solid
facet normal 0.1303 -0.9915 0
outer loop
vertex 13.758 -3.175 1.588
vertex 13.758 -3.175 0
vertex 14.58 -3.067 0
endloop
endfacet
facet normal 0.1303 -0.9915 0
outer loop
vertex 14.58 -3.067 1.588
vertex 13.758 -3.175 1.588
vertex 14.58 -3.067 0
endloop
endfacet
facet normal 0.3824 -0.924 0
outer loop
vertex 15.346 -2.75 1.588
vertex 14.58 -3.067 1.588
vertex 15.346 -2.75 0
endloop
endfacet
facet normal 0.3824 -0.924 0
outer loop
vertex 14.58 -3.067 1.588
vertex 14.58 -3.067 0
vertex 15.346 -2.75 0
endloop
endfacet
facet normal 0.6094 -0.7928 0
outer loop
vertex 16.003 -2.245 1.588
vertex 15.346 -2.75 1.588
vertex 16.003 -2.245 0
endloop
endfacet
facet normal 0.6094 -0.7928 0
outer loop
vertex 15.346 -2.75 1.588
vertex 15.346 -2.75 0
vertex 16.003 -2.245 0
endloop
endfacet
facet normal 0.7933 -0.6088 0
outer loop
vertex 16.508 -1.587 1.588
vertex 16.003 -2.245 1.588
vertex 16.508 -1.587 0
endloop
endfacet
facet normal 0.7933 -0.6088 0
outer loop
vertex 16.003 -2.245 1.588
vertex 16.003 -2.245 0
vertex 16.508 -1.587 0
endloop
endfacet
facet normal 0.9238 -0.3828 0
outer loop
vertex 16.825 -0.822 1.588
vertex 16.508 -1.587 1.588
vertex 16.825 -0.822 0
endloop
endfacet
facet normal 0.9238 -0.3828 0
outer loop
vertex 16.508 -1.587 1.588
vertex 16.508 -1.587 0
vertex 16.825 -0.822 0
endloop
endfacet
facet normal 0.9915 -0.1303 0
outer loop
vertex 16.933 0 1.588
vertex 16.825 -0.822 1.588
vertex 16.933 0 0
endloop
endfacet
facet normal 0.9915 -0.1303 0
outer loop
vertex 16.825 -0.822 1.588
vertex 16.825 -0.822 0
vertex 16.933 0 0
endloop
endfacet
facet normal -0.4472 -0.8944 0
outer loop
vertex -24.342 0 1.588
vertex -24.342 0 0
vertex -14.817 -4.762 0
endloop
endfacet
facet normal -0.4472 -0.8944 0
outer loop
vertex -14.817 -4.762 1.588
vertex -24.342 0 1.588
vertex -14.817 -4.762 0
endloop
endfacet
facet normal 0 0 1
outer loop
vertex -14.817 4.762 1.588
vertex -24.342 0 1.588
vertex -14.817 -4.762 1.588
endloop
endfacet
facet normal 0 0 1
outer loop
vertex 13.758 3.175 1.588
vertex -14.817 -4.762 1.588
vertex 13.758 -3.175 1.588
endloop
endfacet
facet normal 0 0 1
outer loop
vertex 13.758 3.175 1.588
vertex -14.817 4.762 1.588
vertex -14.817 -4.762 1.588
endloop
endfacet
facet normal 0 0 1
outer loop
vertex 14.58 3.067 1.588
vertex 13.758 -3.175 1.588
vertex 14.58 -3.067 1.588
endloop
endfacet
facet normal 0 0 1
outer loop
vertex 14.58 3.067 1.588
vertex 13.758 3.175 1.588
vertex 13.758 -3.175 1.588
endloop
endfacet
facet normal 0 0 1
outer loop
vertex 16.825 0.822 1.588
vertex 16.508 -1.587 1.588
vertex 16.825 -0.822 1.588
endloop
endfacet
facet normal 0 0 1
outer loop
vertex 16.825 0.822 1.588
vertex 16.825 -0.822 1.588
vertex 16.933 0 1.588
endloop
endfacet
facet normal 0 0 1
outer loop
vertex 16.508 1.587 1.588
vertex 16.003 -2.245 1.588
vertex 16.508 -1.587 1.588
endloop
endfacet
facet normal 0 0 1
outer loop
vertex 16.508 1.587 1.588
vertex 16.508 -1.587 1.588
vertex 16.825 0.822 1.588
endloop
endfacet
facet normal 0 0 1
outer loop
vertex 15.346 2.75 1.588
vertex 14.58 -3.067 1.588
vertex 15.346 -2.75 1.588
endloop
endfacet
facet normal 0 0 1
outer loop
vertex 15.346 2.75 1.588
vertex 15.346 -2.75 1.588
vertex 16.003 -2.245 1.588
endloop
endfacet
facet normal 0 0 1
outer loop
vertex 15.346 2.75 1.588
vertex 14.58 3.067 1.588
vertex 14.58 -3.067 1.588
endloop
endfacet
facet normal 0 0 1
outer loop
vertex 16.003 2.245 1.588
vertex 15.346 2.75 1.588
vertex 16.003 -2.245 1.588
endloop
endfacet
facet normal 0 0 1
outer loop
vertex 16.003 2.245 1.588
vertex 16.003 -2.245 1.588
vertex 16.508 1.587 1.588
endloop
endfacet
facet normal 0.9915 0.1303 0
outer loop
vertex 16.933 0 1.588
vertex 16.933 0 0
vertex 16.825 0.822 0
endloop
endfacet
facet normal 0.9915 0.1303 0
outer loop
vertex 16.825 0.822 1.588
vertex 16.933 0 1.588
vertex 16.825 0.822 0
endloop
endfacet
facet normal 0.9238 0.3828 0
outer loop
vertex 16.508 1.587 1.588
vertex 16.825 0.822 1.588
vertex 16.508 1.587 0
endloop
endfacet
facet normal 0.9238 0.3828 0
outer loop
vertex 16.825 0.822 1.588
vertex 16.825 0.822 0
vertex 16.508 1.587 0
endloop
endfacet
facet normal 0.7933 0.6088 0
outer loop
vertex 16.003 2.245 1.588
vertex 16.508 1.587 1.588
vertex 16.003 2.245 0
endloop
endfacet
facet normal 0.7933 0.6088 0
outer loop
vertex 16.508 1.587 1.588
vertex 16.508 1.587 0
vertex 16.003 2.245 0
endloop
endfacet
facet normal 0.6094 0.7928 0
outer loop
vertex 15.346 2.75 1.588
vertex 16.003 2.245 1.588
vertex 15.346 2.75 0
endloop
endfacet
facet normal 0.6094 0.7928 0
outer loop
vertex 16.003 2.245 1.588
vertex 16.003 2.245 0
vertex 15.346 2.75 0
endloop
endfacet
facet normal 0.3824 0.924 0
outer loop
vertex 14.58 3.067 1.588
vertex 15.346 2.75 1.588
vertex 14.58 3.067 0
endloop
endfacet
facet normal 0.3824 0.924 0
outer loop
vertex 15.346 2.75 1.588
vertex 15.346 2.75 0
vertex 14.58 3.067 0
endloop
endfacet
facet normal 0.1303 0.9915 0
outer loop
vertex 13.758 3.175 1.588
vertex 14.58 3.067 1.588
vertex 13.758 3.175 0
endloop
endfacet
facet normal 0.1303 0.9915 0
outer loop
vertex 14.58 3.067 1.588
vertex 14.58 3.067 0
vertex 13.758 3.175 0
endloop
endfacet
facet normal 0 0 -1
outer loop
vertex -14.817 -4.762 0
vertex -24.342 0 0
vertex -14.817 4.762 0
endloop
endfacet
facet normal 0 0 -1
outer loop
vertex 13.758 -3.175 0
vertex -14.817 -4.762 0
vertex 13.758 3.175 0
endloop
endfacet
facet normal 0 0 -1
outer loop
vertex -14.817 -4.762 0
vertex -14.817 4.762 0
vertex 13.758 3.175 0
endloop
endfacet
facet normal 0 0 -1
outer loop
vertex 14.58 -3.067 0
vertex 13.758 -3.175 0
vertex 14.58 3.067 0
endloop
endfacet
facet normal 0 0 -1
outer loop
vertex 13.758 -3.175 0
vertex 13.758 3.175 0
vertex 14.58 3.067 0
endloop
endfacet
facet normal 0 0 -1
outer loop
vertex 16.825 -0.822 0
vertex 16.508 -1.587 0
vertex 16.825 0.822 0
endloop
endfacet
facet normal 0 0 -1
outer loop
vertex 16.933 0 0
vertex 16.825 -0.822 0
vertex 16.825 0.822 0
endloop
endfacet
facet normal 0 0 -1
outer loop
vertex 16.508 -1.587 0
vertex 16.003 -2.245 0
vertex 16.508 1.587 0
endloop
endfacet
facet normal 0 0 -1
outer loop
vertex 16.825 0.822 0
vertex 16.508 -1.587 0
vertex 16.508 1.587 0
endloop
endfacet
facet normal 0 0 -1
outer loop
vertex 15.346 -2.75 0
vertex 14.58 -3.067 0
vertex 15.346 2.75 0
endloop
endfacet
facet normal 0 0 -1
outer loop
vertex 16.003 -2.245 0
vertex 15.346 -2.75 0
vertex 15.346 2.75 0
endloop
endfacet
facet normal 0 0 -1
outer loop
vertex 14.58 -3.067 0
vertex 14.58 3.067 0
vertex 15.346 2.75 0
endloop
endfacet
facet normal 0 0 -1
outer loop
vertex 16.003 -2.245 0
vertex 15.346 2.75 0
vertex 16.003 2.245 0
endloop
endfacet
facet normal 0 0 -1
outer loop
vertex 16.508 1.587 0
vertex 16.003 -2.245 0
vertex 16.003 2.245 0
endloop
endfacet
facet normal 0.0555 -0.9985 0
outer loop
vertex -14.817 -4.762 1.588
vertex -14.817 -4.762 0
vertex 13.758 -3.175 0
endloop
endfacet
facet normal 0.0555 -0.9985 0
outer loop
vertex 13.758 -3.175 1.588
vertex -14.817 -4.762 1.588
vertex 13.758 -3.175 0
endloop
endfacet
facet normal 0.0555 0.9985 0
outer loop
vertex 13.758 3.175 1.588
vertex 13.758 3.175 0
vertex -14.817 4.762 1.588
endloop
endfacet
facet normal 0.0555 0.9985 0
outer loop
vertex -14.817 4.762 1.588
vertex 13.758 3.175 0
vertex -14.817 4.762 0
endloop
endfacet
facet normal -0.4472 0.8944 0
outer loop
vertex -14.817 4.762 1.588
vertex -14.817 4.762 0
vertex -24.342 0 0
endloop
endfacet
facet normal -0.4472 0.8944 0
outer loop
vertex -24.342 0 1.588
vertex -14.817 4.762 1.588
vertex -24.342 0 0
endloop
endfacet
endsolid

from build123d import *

# Parameters (mm, degrees)
F1_DEPTH = 1.5875


with BuildPart() as f1:
    # F0 (on Top) → F1 (new body)
    with BuildSketch(Plane.XY):
        with BuildLine():
            ThreePointArc((10.583333, 0), (11.513269, 2.245064), (13.758333, 3.175))
            Line((13.758333, 3.175), (-14.816667, 4.7625))
            Line((-14.816667, 4.7625), (-24.341667, 0))
            Line((-24.341667, 0), (10.583333, 0))
        make_face()
        with BuildLine():
            ThreePointArc((13.758333, -3.175), (16.003397, -2.245064), (16.933333, 0))
            ThreePointArc((16.933333, 0), (16.003397, 2.245064), (13.758333, 3.175))
            ThreePointArc((13.758333, 3.175), (11.513269, 2.245064), (10.583333, 0))
            ThreePointArc((10.583333, 0), (11.513269, -2.245064), (13.758333, -3.175))
        make_face()
        with BuildLine():
            Line((-14.816667, -4.7625), (13.758333, -3.175))
            ThreePointArc((13.758333, -3.175), (11.513269, -2.245064), (10.583333, 0))
            Line((10.583333, 0), (-24.341667, 0))
            Line((-24.341667, 0), (-14.816667, -4.7625))
        make_face()
    extrude(amount=F1_DEPTH)


solid = f1.part
